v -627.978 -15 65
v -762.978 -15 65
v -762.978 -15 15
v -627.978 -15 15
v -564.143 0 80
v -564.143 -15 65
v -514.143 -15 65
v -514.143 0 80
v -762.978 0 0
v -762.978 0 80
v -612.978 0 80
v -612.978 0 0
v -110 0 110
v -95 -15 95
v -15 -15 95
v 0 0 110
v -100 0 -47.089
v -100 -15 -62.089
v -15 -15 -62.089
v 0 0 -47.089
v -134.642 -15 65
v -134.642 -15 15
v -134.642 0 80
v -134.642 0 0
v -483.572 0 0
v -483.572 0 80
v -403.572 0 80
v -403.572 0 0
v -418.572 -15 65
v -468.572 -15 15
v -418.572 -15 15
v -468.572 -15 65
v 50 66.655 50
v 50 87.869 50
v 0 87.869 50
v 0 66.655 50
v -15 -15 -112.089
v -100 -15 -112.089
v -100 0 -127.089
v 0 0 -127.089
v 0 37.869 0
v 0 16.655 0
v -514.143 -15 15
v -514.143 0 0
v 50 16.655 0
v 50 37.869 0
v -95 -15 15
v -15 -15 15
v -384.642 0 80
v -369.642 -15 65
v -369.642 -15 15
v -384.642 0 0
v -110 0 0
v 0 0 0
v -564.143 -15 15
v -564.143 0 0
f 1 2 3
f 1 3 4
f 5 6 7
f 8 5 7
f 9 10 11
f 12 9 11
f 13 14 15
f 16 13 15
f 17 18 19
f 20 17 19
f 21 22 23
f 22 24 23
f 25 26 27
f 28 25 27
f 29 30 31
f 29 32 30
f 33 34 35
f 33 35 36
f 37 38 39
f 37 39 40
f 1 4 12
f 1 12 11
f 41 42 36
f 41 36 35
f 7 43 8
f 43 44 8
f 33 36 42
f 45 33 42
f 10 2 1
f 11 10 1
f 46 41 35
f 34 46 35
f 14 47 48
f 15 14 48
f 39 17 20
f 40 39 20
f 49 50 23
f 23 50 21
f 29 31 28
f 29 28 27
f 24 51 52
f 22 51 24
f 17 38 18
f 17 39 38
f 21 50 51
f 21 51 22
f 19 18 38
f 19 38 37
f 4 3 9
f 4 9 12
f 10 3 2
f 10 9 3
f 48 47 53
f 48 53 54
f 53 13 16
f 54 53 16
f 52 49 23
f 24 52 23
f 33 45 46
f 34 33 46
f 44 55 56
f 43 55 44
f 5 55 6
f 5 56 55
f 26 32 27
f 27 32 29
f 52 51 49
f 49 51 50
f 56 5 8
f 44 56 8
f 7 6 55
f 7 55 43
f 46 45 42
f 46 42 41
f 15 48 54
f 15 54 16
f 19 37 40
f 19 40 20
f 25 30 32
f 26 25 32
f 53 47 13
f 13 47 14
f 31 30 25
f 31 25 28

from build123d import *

# Parameters (mm, degrees)
F0_W       = 110
F0_H       = 110
F1_DEPTH   = 15
F2_W       = 250
F2_H       = 80
F3_DEPTH   = 15
F4_W       = 80
F4_H       = 80
F5_DEPTH   = 15
F6_W       = 50
F6_H       = 80
F7_DEPTH   = 15
F8_W       = 150
F8_H       = 80
F9_DEPTH   = 15
F11_DEPTH  = 50
F12_W      = 100
F12_H      = 80
F13_DEPTH  = 15
F14_SIZE   = 14.99999
F14_2_SIZE = 14.99999
F14_3_SIZE = 14.99999
F14_4_SIZE = 14.99999
F14_5_SIZE = 14.99999
F14_6_SIZE = 14.99999


# Not quite as in the source:
# - a fillet or chamfer is up to 0.001 mm smaller than in the source, because OpenCascade refuses the exact size


with BuildPart() as f1:
    # F0 (on Front) → F1 (new body)
    with BuildSketch(Plane.XZ):
        with Locations((-55, 55)):
            Rectangle(F0_W, F0_H)
    extrude(amount=F1_DEPTH)

    # F14#2 (size 15 in the source; OpenCascade refuses exactly that, so slightly less here)
    f14_2_edges = [f1.edges().sort_by_distance(p)[0] for p in [
        (-55, -15, 0),
        (0, -15, 55),
        (-55, -15, 110),
        (-110, -15, 55),
    ]]
    chamfer(f14_2_edges, length=F14_2_SIZE)


with BuildPart() as f3:
    # F2 (on Front) → F3 (new body)
    with BuildSketch(Plane.XZ):
        with Locations((-259.6421393369, 40)):
            Rectangle(F2_W, F2_H)
    extrude(amount=F3_DEPTH)

    # F14#3 (size 15 in the source; OpenCascade refuses exactly that, so slightly less here)
    f14_3_edges = [f3.edges().sort_by_distance(p)[0] for p in [
        (-259.642139, -15, 80),
        (-384.642139, -15, 40),
        (-259.642139, -15, 0),
    ]]
    chamfer(f14_3_edges, length=F14_3_SIZE)


with BuildPart() as f5:
    # F4 (on Front) → F5 (new body)
    with BuildSketch(Plane.XZ):
        with Locations((-443.5716368201, 40)):
            Rectangle(F4_W, F4_H)
    extrude(amount=F5_DEPTH)

    # F14 (size 15 in the source; OpenCascade refuses exactly that, so slightly less here)
    f14_edges = [f5.edges().sort_by_distance(p)[0] for p in [
        (-443.571637, -15, 0),
        (-403.571637, -15, 40),
        (-443.571637, -15, 80),
        (-483.571637, -15, 40),
    ]]
    chamfer(f14_edges, length=F14_SIZE)


with BuildPart() as f7:
    # F6 (on Front) → F7 (new body)
    with BuildSketch(Plane.XZ):
        with Locations((-539.1425021022, 40)):
            Rectangle(F6_W, F6_H)
    extrude(amount=F7_DEPTH)

    # F14#4 (size 15 in the source; OpenCascade refuses exactly that, so slightly less here)
    f14_4_edges = [f7.edges().sort_by_distance(p)[0] for p in [
        (-539.142502, -15, 80),
        (-539.142502, -15, 0),
    ]]
    chamfer(f14_4_edges, length=F14_4_SIZE)


with BuildPart() as f9:
    # F8 (on Front) → F9 (new body)
    with BuildSketch(Plane.XZ):
        with Locations((-687.9779948193, 40)):
            Rectangle(F8_W, F8_H)
    extrude(amount=F9_DEPTH)

    # F14#5 (size 15 in the source; OpenCascade refuses exactly that, so slightly less here)
    f14_5_edges = [f9.edges().sort_by_distance(p)[0] for p in [
        (-687.977995, -15, 0),
        (-687.977995, -15, 80),
        (-612.977995, -15, 40),
    ]]
    chamfer(f14_5_edges, length=F14_5_SIZE)


with BuildPart() as f11:
    # F10 (on Right) → F11 (new body)
    with BuildSketch(Plane.YZ):
        Polygon((66.6554310362, 50), (16.6554310362, 0), (37.8686344718, 0), (87.8686344718, 50), align=None)
    extrude(amount=F11_DEPTH)


with BuildPart() as f13:
    # F12 (on Front) → F13 (new body)
    with BuildSketch(Plane.XZ):
        with Locations((-50, -87.0886105629)):
            Rectangle(F12_W, F12_H)
    extrude(amount=F13_DEPTH)

    # F14#6 (size 15 in the source; OpenCascade refuses exactly that, so slightly less here)
    f14_6_edges = [f13.edges().sort_by_distance(p)[0] for p in [
        (0, -15, -87.088611),
        (-50, -15, -47.088611),
        (-50, -15, -127.088611),
    ]]
    chamfer(f14_6_edges, length=F14_6_SIZE)


solid = Compound([f1.part, f3.part, f5.part, f7.part, f9.part, f11.part, f13.part])
